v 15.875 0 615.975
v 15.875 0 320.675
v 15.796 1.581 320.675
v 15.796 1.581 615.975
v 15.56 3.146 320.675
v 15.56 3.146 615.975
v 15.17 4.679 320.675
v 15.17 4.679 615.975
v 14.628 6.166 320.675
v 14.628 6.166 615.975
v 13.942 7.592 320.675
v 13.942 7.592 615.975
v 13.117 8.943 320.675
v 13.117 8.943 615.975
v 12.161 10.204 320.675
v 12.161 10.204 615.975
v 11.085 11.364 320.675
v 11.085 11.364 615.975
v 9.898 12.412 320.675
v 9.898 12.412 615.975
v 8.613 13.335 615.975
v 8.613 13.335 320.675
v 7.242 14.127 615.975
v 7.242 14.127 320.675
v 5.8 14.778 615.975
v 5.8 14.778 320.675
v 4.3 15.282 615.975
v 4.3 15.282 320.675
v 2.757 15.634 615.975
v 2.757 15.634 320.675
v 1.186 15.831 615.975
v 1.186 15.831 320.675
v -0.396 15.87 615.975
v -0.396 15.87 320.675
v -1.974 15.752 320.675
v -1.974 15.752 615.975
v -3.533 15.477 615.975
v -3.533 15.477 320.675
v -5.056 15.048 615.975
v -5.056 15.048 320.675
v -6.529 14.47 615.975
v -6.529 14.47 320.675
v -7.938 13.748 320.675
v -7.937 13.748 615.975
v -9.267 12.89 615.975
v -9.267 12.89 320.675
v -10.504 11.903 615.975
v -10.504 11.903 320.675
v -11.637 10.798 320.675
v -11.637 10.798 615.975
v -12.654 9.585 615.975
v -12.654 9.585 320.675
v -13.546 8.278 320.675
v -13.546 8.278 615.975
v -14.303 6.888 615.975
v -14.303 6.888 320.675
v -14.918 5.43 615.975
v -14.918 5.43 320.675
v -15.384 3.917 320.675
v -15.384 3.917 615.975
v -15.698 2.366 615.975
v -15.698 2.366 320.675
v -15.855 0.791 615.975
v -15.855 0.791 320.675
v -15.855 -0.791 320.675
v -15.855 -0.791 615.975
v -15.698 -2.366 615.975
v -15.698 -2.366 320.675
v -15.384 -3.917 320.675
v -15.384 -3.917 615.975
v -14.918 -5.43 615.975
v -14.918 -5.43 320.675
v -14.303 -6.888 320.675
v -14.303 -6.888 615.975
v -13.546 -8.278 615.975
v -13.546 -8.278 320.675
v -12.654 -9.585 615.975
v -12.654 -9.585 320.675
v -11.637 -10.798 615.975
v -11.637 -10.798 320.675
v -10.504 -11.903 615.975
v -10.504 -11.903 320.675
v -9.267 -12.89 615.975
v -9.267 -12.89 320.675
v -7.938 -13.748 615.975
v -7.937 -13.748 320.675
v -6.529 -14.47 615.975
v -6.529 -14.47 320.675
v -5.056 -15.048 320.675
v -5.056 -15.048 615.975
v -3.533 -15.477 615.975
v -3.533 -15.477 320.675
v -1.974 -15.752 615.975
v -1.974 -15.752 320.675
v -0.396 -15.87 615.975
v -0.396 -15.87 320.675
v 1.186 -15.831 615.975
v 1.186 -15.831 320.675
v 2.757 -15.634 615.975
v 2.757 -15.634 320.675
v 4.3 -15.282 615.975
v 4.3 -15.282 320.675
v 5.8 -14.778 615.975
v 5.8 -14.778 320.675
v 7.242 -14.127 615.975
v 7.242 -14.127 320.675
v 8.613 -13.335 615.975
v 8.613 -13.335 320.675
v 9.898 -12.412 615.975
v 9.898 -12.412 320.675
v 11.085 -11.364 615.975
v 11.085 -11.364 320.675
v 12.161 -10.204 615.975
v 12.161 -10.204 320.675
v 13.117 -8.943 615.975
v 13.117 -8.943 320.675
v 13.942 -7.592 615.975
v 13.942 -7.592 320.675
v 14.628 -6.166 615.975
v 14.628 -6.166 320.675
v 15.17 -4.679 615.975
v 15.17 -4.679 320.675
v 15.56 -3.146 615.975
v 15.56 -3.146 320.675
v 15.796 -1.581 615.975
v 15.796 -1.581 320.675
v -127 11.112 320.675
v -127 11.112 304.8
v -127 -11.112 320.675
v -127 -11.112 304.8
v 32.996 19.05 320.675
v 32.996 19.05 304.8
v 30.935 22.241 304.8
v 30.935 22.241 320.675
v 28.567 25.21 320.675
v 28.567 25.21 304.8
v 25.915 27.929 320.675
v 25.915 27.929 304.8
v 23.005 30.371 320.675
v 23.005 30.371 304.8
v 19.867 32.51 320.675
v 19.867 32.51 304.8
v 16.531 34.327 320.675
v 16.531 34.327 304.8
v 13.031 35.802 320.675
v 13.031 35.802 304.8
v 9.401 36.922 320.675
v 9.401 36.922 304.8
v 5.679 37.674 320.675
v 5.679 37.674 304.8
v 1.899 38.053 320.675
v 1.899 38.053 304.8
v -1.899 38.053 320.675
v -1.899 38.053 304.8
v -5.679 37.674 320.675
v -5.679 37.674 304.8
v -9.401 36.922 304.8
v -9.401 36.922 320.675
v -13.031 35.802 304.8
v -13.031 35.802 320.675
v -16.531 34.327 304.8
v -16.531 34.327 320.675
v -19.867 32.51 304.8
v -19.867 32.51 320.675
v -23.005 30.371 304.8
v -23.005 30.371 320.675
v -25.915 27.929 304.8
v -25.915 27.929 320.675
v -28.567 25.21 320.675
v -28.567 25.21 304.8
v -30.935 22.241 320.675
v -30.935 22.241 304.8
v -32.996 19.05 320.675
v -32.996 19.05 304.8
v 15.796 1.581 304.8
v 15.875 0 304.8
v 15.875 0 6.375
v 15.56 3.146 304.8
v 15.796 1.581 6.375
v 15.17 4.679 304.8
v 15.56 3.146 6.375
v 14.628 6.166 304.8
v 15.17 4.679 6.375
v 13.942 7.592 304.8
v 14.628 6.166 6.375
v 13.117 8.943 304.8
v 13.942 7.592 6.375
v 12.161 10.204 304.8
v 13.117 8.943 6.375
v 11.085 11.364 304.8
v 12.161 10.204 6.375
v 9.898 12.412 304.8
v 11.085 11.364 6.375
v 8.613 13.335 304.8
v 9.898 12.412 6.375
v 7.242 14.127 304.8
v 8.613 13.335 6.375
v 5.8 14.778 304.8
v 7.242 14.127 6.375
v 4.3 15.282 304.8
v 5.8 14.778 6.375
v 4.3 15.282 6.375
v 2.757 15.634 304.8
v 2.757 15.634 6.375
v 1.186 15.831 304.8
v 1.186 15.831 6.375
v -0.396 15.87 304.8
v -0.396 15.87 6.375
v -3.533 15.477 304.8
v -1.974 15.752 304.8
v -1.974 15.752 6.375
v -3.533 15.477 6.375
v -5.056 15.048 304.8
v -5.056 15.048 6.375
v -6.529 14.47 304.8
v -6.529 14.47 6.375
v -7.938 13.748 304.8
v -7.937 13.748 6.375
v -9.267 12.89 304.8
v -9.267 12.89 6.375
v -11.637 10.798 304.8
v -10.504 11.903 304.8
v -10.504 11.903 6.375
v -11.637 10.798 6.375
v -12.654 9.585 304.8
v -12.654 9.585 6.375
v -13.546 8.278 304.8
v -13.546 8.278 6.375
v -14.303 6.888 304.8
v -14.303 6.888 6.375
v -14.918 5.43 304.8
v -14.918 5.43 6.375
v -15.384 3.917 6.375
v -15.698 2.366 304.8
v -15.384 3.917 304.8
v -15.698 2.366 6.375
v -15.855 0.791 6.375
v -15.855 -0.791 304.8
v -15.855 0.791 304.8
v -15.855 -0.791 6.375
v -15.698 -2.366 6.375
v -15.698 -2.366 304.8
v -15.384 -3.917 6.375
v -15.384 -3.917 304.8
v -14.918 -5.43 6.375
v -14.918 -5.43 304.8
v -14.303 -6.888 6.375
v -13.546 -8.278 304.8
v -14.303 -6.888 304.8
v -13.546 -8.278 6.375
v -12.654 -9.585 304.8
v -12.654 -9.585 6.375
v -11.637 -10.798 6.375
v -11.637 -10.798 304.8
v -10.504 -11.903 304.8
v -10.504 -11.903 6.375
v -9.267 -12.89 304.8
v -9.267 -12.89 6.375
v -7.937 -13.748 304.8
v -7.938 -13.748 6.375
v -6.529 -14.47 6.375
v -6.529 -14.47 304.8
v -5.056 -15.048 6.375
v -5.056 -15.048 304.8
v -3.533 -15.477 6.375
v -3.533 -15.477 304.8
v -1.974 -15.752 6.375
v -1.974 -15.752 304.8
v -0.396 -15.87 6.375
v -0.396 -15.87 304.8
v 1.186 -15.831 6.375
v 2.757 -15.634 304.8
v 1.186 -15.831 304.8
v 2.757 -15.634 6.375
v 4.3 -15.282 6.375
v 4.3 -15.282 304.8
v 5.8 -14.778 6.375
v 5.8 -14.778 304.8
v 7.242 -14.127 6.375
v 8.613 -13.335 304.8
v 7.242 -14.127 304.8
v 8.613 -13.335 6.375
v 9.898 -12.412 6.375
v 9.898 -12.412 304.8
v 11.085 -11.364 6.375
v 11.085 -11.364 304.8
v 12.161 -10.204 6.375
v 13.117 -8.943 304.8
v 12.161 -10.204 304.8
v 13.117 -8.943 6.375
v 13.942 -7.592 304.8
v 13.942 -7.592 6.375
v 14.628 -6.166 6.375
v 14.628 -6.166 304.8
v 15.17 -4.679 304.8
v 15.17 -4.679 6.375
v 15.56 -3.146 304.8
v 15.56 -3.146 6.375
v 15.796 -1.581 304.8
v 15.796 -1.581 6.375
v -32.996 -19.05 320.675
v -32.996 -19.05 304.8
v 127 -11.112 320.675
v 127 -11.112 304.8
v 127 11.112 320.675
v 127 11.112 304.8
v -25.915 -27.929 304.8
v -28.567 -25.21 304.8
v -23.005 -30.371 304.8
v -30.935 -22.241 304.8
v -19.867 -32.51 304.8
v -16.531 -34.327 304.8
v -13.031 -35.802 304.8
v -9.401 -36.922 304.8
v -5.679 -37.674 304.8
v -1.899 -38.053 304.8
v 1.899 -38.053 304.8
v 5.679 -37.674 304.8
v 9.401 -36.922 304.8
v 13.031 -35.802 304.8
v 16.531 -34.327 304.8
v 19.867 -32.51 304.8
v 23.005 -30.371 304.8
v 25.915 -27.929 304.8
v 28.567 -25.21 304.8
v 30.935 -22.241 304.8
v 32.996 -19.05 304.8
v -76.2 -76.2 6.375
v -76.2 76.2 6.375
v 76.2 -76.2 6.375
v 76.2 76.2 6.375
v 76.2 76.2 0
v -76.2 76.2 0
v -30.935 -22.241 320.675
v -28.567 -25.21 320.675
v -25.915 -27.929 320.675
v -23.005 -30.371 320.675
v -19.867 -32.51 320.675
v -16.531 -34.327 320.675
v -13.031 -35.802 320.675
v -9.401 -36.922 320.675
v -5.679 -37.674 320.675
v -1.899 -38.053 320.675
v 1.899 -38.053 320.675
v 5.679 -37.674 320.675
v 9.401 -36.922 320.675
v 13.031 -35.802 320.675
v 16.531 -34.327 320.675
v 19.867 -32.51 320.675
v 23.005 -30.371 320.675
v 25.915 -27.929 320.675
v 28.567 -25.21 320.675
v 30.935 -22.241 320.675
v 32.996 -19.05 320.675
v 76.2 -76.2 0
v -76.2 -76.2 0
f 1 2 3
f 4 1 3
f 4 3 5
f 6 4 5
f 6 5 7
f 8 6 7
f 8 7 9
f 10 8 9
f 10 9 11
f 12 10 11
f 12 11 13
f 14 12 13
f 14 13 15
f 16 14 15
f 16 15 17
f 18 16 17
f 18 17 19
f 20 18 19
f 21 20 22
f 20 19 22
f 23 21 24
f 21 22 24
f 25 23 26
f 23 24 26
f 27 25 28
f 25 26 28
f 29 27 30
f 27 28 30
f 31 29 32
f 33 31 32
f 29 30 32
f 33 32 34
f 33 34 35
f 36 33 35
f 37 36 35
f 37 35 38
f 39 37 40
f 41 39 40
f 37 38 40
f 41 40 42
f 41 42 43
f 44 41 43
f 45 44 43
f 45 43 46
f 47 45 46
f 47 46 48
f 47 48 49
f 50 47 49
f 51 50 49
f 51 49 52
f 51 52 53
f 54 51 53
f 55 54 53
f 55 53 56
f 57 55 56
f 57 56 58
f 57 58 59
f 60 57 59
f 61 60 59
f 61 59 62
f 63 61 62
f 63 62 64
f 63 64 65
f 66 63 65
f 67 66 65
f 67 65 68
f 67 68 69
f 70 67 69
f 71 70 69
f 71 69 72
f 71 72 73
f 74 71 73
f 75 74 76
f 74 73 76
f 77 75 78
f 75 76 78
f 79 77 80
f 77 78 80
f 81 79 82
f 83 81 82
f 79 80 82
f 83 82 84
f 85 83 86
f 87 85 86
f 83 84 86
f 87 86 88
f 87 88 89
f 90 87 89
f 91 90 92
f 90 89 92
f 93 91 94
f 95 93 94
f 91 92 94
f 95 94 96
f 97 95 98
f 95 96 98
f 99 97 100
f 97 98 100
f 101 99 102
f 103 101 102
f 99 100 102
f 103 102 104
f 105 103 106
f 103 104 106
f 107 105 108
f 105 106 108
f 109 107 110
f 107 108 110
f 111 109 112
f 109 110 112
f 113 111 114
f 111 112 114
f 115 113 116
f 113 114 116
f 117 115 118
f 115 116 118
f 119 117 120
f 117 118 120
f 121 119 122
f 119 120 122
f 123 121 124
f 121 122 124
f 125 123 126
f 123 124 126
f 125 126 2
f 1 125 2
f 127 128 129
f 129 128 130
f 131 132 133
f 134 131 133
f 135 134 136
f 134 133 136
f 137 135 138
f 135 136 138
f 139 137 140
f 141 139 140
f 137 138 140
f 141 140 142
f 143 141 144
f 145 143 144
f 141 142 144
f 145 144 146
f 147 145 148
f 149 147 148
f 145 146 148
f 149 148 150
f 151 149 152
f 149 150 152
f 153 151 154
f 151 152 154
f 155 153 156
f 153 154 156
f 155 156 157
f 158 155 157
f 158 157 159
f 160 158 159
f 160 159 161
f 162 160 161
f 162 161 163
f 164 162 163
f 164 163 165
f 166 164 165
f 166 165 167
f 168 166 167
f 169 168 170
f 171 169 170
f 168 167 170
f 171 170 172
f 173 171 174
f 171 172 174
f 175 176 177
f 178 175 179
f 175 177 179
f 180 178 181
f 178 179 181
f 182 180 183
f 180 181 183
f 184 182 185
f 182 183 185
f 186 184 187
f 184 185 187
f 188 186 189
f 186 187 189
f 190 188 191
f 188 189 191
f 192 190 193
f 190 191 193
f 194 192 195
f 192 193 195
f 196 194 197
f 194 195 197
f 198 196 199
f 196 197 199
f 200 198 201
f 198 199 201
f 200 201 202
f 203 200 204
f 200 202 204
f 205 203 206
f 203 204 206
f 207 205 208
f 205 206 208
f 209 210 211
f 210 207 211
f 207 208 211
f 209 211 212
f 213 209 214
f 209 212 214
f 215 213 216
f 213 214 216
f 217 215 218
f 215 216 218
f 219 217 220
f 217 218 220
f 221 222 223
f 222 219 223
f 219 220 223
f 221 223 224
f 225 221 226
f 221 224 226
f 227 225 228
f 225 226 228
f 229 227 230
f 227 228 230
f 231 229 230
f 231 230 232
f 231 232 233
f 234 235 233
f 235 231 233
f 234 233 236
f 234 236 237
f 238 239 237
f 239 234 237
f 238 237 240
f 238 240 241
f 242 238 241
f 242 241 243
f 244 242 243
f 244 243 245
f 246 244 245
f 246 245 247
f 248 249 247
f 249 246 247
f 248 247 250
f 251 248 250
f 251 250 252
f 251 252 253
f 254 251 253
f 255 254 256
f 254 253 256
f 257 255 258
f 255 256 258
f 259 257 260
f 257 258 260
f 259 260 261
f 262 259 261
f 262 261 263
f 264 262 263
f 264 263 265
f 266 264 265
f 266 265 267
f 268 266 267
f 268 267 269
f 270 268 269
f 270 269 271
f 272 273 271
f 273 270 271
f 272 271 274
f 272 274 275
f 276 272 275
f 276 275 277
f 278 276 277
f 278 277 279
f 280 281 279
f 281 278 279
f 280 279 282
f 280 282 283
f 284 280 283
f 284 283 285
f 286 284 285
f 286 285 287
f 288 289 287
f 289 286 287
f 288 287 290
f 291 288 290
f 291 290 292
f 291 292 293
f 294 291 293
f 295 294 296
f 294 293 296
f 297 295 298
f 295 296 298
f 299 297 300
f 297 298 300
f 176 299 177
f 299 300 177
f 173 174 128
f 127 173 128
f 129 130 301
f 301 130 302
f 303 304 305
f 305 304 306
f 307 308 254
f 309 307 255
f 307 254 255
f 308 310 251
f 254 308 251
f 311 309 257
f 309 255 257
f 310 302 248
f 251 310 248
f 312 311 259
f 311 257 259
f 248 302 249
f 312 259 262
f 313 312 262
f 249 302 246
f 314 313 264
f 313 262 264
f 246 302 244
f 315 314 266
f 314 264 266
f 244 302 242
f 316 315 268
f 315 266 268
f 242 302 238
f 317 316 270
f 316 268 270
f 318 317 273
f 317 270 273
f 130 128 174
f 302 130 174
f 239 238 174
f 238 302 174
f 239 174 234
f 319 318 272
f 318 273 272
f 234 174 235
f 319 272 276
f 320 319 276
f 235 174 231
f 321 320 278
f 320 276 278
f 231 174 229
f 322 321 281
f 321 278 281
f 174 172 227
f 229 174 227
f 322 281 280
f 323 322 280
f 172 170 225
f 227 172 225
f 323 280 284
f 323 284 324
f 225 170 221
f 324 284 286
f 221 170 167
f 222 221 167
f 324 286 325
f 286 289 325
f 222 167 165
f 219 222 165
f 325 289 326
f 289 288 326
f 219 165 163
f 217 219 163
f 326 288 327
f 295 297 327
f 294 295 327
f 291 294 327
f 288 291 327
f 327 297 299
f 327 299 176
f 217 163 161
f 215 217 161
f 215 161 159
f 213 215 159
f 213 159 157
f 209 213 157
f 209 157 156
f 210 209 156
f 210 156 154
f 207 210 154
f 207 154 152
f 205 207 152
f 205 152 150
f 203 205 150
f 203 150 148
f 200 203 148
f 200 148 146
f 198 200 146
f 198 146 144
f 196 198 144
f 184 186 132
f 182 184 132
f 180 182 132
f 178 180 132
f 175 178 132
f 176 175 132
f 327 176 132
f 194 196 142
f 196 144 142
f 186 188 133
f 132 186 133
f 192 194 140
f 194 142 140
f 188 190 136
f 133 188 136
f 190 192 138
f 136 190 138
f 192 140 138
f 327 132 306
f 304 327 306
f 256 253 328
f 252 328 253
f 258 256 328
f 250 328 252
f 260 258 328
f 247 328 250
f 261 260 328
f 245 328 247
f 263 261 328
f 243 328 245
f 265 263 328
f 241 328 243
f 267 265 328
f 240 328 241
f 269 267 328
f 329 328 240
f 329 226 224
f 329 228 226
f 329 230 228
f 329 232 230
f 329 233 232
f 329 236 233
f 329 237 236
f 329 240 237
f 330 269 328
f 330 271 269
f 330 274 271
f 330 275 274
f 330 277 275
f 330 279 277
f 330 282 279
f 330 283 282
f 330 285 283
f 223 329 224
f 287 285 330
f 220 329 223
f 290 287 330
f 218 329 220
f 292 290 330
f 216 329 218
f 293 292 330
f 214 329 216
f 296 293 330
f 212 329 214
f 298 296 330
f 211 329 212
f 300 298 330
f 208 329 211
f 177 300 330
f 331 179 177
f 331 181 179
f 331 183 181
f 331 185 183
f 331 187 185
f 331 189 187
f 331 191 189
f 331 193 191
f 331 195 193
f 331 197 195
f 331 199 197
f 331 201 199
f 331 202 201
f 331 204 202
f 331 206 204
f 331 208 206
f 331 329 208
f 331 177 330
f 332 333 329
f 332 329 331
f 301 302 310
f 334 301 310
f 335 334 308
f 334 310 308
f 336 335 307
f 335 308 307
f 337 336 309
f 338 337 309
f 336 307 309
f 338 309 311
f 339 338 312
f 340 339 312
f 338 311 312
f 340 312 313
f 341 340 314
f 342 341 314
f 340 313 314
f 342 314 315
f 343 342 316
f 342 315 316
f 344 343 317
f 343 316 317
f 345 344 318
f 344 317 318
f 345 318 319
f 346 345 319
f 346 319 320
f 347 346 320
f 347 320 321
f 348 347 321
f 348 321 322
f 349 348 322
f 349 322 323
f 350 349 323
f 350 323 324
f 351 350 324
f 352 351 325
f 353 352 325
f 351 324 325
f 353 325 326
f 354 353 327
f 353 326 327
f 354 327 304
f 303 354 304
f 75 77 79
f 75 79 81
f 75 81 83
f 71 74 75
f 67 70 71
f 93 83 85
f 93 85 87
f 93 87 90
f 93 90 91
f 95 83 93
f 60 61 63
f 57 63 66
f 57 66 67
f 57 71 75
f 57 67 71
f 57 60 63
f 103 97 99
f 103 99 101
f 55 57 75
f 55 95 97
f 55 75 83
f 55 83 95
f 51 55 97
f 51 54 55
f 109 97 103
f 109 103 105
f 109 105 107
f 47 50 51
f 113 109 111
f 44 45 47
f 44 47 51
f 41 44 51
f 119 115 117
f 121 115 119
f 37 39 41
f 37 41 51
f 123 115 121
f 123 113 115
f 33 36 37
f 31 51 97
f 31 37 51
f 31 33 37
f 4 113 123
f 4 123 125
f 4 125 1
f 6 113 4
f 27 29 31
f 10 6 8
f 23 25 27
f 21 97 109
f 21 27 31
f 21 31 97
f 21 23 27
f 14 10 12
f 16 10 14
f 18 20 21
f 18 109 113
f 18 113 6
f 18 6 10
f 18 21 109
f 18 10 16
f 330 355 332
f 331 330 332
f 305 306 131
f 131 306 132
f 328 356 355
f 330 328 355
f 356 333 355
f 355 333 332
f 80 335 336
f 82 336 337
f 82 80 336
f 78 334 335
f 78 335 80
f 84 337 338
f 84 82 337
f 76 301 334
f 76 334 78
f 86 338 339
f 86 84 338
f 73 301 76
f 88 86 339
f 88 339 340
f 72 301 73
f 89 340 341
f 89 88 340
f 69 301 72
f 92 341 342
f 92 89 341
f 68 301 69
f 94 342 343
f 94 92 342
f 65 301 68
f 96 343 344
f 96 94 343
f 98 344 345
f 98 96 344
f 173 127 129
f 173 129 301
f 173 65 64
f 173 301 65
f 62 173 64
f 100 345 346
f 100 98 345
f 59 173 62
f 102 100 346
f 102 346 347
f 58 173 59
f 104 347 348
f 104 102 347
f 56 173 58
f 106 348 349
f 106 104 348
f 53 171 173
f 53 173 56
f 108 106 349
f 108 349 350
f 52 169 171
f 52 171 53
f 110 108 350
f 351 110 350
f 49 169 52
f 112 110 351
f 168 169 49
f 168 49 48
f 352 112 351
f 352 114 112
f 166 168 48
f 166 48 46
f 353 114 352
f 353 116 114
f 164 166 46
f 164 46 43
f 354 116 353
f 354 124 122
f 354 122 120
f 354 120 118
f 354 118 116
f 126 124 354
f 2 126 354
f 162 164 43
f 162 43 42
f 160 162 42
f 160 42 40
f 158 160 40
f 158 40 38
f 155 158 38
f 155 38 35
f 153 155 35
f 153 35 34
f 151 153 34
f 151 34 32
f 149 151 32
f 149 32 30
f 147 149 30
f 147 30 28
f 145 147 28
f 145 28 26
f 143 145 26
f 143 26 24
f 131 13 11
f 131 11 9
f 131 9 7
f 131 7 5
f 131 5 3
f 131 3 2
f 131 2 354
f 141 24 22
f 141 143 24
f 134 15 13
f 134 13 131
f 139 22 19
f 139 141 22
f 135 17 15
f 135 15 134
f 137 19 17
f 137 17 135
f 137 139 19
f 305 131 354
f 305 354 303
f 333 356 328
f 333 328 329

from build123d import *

# Parameters (mm, degrees)
F0_W     = 152.4
F0_H     = 152.4
F1_DEPTH = 6.3754
F2_R     = 15.875
F3_DEPTH = 609.6
F6_DEPTH = 15.875


with BuildPart() as f1:
    # F0 (on Top) → F1 (new body)
    with BuildSketch(Plane.XY):
        Rectangle(F0_W, F0_H)
    extrude(amount=F1_DEPTH)

    # F2 (on face) → F3 (join)
    with BuildSketch(Plane.XY.offset(6.3754)):
        Circle(F2_R)
    extrude(amount=F3_DEPTH)

    # F5 (on offset) → F6 (join)
    with BuildSketch(Plane.XY.offset(304.8)):
        with BuildLine():
            Line((127, 11.1125), (32.995568, 19.05))
            ThreePointArc((32.995568, 19.05), (0, 38.1), (-32.995568, 19.05))
            Line((-32.995568, 19.05), (-127, 11.1125))
            Line((-127, 11.1125), (-127, -11.1125))
            Line((-127, -11.1125), (-32.995568, -19.05))
            ThreePointArc((-32.995568, -19.05), (0, -38.1), (32.995568, -19.05))
            Line((32.995568, -19.05), (127, -11.1125))
            Line((127, -11.1125), (127, 11.1125))
        make_face()
    extrude(amount=F6_DEPTH)


solid = f1.part
